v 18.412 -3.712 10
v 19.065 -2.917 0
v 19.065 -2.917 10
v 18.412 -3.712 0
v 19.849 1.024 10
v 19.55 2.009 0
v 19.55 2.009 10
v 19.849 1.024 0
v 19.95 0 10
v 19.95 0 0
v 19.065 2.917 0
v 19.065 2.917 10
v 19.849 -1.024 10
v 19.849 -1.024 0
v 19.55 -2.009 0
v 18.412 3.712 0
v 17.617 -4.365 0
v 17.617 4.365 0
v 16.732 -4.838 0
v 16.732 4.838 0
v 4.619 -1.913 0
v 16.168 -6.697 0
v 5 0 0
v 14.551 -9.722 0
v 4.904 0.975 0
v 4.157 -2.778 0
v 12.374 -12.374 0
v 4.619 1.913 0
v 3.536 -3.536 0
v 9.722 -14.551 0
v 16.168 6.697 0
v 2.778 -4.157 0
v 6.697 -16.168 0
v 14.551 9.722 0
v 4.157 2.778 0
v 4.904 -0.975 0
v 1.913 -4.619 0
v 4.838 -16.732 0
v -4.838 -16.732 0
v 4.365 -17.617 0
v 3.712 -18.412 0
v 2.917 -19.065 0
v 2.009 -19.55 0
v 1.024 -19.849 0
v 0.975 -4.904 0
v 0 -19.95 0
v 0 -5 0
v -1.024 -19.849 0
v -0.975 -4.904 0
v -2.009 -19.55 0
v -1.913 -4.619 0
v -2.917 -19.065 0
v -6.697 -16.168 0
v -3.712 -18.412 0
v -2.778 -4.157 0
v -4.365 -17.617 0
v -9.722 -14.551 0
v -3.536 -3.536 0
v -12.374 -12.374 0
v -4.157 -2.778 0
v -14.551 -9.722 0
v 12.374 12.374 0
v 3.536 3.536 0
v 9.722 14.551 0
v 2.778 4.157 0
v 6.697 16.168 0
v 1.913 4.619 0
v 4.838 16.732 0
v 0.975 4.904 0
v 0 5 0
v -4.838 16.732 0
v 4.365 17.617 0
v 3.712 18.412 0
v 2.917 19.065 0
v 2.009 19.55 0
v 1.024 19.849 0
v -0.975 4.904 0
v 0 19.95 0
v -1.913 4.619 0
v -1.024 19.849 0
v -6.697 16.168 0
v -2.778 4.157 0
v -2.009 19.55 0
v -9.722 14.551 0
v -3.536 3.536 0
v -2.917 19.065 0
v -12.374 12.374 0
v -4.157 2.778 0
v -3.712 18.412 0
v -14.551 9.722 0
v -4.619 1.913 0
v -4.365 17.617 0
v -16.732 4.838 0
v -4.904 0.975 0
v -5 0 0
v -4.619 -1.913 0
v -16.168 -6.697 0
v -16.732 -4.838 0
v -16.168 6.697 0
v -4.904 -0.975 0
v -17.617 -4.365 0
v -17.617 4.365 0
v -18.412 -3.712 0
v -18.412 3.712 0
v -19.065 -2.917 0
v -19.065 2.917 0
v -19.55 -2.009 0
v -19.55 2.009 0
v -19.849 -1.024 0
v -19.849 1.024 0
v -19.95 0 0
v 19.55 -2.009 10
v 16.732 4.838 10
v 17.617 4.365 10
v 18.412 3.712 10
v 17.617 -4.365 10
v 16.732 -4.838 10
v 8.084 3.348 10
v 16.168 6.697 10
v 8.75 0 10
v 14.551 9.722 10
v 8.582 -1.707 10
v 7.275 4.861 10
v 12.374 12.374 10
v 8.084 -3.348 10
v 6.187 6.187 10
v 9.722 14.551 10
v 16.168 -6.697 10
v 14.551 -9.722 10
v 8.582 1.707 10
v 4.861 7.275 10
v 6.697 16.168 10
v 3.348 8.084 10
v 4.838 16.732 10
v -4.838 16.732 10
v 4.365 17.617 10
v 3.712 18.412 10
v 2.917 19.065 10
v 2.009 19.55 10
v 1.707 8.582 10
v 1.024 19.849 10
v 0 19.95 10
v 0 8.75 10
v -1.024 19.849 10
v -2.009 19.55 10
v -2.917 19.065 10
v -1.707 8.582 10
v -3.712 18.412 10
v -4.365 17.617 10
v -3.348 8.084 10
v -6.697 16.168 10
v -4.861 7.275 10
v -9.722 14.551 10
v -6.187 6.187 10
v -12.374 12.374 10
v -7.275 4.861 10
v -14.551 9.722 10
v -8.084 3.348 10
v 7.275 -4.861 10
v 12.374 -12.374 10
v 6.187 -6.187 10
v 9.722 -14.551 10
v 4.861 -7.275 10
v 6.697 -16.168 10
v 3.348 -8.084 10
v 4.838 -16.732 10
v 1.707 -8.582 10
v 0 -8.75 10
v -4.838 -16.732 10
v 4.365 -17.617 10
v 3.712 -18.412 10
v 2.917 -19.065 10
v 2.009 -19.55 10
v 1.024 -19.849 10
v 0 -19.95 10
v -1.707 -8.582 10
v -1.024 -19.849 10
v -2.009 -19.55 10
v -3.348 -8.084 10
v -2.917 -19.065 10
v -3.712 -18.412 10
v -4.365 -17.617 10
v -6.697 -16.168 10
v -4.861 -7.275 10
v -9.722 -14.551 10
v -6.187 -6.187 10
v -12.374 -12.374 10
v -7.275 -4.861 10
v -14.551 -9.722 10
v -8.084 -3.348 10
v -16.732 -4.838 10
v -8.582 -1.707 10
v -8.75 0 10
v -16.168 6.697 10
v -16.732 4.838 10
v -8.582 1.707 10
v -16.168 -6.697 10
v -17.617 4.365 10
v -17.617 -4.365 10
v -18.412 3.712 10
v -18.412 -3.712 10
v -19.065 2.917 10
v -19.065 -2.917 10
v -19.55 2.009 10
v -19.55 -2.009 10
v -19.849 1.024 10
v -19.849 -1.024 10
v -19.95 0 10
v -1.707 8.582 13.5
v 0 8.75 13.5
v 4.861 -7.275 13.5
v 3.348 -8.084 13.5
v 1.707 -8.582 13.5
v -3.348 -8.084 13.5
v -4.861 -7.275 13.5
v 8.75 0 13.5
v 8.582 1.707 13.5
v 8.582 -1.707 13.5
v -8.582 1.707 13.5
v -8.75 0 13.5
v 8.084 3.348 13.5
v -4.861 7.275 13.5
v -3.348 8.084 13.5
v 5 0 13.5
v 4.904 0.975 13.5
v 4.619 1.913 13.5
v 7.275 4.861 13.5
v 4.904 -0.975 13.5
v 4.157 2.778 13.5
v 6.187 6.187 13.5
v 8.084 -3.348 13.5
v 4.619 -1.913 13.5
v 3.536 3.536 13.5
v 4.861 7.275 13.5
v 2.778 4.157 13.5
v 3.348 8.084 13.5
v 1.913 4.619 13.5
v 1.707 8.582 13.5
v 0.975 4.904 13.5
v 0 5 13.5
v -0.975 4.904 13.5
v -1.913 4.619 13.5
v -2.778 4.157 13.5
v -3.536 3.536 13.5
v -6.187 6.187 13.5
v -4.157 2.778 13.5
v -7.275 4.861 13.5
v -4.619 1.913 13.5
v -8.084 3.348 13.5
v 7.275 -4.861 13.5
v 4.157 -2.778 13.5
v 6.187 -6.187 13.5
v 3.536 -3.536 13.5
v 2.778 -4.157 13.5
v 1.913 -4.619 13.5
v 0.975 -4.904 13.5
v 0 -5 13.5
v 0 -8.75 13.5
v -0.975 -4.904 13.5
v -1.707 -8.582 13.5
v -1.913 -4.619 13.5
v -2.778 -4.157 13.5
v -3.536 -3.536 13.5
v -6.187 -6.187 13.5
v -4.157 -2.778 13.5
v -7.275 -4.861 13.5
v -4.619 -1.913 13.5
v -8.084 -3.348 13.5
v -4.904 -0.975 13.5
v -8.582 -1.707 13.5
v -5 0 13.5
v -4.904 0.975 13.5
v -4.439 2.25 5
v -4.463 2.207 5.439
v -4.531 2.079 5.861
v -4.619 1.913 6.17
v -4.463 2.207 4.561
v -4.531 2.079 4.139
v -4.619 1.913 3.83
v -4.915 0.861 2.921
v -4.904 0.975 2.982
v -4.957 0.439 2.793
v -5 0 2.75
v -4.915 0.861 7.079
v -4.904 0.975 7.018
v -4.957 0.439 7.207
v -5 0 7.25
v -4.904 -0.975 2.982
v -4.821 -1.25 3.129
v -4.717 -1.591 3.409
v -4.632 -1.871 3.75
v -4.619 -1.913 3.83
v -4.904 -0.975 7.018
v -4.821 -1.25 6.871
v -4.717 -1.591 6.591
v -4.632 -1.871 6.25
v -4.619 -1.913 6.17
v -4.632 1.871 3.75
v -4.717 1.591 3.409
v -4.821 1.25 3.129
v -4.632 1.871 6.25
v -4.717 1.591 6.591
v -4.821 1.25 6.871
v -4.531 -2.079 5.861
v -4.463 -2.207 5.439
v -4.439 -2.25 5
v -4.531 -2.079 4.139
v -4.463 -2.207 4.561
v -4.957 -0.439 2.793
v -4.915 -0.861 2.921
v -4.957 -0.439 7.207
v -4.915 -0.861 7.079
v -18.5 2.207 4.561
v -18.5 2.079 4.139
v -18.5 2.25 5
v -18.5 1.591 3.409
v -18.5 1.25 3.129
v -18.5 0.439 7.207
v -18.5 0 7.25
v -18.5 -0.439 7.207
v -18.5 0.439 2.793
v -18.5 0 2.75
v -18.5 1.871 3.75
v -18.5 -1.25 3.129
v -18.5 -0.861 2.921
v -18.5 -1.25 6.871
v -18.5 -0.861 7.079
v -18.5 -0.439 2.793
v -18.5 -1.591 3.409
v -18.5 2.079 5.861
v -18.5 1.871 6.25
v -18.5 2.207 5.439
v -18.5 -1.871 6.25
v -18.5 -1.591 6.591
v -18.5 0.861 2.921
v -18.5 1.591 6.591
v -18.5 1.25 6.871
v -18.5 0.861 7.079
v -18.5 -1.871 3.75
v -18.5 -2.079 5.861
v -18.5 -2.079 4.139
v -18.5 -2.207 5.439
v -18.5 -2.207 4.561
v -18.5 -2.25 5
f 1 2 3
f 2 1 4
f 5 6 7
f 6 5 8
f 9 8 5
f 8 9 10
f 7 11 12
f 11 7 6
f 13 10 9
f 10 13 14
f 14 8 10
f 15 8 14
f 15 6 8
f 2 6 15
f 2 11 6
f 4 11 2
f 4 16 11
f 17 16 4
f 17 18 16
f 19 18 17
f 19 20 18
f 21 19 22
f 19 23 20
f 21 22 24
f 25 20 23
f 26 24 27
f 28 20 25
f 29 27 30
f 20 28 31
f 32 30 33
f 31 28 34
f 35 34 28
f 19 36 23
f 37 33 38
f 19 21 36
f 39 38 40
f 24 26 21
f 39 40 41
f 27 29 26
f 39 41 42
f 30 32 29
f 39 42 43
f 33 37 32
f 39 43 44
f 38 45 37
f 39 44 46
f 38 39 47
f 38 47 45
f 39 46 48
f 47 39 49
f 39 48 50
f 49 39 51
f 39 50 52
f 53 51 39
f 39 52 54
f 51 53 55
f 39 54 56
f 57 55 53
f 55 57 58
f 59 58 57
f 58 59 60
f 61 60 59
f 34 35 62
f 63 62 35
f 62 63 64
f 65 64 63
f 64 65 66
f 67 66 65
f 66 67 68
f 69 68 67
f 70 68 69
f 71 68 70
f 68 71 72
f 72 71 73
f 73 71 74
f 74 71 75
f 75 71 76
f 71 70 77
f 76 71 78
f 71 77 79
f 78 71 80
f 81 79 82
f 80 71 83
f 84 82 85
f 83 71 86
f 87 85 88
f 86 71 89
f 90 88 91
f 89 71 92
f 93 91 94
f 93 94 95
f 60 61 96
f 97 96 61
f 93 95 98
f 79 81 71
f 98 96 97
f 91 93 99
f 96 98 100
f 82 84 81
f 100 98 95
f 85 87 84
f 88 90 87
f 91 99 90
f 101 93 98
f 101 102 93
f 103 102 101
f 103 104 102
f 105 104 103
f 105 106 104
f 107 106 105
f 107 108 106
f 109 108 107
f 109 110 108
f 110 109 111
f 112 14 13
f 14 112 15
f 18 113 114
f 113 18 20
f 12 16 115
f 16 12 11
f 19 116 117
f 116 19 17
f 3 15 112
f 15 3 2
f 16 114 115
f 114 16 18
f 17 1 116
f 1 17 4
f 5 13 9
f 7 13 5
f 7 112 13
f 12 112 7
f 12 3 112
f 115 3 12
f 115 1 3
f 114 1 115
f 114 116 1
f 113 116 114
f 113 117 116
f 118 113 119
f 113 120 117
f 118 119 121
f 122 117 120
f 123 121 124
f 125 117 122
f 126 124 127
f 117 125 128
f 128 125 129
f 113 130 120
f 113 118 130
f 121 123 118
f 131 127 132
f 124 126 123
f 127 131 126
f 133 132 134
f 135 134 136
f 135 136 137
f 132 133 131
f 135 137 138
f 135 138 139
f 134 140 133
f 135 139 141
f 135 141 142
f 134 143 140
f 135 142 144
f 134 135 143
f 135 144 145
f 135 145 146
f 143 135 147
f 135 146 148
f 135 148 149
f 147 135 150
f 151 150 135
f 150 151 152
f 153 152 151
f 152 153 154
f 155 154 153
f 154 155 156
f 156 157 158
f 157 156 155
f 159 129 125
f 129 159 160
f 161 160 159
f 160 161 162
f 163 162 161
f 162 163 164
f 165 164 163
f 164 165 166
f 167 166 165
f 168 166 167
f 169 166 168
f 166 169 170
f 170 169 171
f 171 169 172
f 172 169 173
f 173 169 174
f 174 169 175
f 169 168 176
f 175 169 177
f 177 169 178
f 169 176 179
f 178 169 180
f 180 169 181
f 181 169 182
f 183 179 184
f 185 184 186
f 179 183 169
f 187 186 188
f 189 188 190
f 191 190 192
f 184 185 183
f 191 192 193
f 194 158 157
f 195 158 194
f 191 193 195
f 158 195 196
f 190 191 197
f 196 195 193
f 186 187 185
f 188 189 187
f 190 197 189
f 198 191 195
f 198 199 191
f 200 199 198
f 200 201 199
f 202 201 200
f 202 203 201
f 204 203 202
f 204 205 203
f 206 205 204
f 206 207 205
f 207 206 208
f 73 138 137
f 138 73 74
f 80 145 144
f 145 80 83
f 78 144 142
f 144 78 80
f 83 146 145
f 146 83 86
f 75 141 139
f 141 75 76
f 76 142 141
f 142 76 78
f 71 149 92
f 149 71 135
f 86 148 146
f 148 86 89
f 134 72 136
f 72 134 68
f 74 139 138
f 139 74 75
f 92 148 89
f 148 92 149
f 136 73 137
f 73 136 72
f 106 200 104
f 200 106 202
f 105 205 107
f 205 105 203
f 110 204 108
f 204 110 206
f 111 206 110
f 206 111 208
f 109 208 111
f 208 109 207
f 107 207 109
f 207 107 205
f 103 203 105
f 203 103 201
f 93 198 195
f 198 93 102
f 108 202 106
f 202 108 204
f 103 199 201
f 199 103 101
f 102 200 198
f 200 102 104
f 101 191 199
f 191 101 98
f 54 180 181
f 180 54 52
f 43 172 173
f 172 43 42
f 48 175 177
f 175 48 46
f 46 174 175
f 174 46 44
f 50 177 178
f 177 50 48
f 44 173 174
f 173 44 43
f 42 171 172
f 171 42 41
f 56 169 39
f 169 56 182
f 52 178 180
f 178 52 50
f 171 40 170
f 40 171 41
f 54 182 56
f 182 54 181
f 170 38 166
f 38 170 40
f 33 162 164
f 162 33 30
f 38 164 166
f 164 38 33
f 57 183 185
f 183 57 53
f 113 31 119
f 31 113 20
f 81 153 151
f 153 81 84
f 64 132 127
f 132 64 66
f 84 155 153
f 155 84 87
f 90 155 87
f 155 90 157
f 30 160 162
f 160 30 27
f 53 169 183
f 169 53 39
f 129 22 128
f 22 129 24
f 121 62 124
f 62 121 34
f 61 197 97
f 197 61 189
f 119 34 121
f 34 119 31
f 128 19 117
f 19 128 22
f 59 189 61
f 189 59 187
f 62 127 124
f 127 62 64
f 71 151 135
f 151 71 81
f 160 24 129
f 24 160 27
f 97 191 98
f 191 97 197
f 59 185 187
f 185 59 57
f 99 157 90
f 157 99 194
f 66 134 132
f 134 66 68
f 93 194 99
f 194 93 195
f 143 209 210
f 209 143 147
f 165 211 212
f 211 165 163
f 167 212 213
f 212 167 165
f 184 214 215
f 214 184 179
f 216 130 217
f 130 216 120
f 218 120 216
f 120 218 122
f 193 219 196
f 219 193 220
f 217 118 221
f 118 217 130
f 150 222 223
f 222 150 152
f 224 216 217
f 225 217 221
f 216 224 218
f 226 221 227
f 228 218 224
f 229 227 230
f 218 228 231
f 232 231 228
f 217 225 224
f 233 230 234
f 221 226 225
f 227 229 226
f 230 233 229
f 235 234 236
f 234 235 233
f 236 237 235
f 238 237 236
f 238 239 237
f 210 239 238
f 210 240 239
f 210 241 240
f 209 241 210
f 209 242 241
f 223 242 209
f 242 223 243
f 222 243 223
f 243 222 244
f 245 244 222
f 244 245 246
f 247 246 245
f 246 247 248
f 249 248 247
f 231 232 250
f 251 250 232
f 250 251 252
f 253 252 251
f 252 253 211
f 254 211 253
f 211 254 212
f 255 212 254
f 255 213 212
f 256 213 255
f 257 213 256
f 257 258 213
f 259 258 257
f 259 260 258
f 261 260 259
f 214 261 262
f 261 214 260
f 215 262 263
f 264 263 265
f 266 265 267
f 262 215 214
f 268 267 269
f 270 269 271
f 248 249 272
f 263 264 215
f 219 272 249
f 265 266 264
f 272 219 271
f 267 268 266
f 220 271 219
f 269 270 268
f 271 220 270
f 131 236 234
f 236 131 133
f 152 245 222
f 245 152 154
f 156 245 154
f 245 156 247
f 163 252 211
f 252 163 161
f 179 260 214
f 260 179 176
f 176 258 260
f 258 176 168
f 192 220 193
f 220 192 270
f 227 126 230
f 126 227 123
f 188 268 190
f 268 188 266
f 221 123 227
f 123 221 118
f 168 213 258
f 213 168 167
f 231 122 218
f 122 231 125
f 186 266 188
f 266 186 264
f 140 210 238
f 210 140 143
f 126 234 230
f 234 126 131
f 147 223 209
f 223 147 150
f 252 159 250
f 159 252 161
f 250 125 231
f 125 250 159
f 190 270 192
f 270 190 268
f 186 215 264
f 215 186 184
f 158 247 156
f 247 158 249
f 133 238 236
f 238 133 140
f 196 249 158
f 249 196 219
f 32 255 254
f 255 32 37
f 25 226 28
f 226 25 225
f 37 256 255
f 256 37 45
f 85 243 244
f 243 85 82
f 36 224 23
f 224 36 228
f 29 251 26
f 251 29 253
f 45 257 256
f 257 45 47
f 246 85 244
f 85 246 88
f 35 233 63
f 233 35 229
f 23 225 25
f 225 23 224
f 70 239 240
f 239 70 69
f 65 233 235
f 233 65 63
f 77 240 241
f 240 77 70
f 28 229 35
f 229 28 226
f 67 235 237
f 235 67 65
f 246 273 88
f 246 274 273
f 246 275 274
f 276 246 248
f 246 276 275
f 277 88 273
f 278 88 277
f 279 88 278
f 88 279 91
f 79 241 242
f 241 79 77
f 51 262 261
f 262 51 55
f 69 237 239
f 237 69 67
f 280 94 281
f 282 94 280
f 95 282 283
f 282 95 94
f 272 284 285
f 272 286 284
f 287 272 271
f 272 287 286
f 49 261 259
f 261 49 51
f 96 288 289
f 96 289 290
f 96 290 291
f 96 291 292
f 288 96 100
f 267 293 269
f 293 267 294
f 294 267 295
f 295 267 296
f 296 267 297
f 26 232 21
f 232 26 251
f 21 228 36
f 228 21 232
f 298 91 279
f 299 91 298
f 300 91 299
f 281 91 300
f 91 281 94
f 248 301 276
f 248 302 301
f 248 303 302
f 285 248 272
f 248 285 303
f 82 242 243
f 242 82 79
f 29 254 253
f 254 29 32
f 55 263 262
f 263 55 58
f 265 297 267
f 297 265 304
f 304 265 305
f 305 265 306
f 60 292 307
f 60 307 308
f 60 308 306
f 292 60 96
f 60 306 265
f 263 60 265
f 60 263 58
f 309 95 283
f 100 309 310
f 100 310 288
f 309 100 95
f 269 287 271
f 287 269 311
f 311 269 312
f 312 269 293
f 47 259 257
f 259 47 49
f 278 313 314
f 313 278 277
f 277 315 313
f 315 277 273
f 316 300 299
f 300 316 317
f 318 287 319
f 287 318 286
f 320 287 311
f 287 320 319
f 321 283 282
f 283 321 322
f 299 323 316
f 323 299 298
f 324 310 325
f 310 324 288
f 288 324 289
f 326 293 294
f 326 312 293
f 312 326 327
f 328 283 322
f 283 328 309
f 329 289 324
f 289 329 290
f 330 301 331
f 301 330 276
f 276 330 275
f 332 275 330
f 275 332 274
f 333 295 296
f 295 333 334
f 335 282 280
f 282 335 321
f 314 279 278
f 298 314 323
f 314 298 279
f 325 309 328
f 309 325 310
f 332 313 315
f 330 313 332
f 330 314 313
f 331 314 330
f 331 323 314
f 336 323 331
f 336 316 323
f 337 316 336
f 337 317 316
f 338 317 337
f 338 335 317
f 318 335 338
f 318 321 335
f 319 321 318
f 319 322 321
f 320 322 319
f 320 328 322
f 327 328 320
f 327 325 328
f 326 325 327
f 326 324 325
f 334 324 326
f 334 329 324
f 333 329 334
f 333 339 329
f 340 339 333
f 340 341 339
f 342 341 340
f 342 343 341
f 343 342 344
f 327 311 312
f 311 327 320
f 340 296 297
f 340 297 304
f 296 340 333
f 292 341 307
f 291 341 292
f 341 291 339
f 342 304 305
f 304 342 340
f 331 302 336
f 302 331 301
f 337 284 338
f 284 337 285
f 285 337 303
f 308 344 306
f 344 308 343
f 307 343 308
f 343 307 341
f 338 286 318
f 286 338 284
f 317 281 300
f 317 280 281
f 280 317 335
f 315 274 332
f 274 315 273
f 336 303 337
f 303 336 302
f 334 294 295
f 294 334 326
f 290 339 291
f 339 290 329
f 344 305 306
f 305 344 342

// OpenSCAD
$fn = 32;

// ----------------------------------------------------------------------
// Hand knob: 35 x 35 x 13.5 mm
// ----------------------------------------------------------------------

// --- parameters (mm) ---
head_d = 35;              // knob diameter
head_h = 10;              // knob height
hole_d = 10;              // shaft bore
set_d = 4.5;              // set screw tap hole
notch_d = 1.52;           // knurl groove diameter
lobes = 4;                // grip lobes
cap_h = 3.5;              // raised centre cap
cap_d = 17.5;             // centre cap diameter

module body() {
  cylinder(h = head_h, d = head_d);
  for (i = [0 : lobes - 1])
    rotate([0, 0, i * 360 / lobes])
      translate([head_d * 0.42, 0, 0])
        cylinder(h = head_h, d = head_d * 0.3);
}

module cap() {
  translate([0, 0, head_h - 1]) cylinder(h = cap_h + 1, d = cap_d);
}

difference() {
  union() {
    body();
    cap();
  }
  translate([0, 0, -1]) cylinder(h = head_h + cap_h + 2, d = hole_d);
  translate([-head_d / 2 - 1, 0, head_h * 0.5]) rotate([0, 90, 0]) cylinder(h = head_d / 2 + 2, d = set_d);
}
